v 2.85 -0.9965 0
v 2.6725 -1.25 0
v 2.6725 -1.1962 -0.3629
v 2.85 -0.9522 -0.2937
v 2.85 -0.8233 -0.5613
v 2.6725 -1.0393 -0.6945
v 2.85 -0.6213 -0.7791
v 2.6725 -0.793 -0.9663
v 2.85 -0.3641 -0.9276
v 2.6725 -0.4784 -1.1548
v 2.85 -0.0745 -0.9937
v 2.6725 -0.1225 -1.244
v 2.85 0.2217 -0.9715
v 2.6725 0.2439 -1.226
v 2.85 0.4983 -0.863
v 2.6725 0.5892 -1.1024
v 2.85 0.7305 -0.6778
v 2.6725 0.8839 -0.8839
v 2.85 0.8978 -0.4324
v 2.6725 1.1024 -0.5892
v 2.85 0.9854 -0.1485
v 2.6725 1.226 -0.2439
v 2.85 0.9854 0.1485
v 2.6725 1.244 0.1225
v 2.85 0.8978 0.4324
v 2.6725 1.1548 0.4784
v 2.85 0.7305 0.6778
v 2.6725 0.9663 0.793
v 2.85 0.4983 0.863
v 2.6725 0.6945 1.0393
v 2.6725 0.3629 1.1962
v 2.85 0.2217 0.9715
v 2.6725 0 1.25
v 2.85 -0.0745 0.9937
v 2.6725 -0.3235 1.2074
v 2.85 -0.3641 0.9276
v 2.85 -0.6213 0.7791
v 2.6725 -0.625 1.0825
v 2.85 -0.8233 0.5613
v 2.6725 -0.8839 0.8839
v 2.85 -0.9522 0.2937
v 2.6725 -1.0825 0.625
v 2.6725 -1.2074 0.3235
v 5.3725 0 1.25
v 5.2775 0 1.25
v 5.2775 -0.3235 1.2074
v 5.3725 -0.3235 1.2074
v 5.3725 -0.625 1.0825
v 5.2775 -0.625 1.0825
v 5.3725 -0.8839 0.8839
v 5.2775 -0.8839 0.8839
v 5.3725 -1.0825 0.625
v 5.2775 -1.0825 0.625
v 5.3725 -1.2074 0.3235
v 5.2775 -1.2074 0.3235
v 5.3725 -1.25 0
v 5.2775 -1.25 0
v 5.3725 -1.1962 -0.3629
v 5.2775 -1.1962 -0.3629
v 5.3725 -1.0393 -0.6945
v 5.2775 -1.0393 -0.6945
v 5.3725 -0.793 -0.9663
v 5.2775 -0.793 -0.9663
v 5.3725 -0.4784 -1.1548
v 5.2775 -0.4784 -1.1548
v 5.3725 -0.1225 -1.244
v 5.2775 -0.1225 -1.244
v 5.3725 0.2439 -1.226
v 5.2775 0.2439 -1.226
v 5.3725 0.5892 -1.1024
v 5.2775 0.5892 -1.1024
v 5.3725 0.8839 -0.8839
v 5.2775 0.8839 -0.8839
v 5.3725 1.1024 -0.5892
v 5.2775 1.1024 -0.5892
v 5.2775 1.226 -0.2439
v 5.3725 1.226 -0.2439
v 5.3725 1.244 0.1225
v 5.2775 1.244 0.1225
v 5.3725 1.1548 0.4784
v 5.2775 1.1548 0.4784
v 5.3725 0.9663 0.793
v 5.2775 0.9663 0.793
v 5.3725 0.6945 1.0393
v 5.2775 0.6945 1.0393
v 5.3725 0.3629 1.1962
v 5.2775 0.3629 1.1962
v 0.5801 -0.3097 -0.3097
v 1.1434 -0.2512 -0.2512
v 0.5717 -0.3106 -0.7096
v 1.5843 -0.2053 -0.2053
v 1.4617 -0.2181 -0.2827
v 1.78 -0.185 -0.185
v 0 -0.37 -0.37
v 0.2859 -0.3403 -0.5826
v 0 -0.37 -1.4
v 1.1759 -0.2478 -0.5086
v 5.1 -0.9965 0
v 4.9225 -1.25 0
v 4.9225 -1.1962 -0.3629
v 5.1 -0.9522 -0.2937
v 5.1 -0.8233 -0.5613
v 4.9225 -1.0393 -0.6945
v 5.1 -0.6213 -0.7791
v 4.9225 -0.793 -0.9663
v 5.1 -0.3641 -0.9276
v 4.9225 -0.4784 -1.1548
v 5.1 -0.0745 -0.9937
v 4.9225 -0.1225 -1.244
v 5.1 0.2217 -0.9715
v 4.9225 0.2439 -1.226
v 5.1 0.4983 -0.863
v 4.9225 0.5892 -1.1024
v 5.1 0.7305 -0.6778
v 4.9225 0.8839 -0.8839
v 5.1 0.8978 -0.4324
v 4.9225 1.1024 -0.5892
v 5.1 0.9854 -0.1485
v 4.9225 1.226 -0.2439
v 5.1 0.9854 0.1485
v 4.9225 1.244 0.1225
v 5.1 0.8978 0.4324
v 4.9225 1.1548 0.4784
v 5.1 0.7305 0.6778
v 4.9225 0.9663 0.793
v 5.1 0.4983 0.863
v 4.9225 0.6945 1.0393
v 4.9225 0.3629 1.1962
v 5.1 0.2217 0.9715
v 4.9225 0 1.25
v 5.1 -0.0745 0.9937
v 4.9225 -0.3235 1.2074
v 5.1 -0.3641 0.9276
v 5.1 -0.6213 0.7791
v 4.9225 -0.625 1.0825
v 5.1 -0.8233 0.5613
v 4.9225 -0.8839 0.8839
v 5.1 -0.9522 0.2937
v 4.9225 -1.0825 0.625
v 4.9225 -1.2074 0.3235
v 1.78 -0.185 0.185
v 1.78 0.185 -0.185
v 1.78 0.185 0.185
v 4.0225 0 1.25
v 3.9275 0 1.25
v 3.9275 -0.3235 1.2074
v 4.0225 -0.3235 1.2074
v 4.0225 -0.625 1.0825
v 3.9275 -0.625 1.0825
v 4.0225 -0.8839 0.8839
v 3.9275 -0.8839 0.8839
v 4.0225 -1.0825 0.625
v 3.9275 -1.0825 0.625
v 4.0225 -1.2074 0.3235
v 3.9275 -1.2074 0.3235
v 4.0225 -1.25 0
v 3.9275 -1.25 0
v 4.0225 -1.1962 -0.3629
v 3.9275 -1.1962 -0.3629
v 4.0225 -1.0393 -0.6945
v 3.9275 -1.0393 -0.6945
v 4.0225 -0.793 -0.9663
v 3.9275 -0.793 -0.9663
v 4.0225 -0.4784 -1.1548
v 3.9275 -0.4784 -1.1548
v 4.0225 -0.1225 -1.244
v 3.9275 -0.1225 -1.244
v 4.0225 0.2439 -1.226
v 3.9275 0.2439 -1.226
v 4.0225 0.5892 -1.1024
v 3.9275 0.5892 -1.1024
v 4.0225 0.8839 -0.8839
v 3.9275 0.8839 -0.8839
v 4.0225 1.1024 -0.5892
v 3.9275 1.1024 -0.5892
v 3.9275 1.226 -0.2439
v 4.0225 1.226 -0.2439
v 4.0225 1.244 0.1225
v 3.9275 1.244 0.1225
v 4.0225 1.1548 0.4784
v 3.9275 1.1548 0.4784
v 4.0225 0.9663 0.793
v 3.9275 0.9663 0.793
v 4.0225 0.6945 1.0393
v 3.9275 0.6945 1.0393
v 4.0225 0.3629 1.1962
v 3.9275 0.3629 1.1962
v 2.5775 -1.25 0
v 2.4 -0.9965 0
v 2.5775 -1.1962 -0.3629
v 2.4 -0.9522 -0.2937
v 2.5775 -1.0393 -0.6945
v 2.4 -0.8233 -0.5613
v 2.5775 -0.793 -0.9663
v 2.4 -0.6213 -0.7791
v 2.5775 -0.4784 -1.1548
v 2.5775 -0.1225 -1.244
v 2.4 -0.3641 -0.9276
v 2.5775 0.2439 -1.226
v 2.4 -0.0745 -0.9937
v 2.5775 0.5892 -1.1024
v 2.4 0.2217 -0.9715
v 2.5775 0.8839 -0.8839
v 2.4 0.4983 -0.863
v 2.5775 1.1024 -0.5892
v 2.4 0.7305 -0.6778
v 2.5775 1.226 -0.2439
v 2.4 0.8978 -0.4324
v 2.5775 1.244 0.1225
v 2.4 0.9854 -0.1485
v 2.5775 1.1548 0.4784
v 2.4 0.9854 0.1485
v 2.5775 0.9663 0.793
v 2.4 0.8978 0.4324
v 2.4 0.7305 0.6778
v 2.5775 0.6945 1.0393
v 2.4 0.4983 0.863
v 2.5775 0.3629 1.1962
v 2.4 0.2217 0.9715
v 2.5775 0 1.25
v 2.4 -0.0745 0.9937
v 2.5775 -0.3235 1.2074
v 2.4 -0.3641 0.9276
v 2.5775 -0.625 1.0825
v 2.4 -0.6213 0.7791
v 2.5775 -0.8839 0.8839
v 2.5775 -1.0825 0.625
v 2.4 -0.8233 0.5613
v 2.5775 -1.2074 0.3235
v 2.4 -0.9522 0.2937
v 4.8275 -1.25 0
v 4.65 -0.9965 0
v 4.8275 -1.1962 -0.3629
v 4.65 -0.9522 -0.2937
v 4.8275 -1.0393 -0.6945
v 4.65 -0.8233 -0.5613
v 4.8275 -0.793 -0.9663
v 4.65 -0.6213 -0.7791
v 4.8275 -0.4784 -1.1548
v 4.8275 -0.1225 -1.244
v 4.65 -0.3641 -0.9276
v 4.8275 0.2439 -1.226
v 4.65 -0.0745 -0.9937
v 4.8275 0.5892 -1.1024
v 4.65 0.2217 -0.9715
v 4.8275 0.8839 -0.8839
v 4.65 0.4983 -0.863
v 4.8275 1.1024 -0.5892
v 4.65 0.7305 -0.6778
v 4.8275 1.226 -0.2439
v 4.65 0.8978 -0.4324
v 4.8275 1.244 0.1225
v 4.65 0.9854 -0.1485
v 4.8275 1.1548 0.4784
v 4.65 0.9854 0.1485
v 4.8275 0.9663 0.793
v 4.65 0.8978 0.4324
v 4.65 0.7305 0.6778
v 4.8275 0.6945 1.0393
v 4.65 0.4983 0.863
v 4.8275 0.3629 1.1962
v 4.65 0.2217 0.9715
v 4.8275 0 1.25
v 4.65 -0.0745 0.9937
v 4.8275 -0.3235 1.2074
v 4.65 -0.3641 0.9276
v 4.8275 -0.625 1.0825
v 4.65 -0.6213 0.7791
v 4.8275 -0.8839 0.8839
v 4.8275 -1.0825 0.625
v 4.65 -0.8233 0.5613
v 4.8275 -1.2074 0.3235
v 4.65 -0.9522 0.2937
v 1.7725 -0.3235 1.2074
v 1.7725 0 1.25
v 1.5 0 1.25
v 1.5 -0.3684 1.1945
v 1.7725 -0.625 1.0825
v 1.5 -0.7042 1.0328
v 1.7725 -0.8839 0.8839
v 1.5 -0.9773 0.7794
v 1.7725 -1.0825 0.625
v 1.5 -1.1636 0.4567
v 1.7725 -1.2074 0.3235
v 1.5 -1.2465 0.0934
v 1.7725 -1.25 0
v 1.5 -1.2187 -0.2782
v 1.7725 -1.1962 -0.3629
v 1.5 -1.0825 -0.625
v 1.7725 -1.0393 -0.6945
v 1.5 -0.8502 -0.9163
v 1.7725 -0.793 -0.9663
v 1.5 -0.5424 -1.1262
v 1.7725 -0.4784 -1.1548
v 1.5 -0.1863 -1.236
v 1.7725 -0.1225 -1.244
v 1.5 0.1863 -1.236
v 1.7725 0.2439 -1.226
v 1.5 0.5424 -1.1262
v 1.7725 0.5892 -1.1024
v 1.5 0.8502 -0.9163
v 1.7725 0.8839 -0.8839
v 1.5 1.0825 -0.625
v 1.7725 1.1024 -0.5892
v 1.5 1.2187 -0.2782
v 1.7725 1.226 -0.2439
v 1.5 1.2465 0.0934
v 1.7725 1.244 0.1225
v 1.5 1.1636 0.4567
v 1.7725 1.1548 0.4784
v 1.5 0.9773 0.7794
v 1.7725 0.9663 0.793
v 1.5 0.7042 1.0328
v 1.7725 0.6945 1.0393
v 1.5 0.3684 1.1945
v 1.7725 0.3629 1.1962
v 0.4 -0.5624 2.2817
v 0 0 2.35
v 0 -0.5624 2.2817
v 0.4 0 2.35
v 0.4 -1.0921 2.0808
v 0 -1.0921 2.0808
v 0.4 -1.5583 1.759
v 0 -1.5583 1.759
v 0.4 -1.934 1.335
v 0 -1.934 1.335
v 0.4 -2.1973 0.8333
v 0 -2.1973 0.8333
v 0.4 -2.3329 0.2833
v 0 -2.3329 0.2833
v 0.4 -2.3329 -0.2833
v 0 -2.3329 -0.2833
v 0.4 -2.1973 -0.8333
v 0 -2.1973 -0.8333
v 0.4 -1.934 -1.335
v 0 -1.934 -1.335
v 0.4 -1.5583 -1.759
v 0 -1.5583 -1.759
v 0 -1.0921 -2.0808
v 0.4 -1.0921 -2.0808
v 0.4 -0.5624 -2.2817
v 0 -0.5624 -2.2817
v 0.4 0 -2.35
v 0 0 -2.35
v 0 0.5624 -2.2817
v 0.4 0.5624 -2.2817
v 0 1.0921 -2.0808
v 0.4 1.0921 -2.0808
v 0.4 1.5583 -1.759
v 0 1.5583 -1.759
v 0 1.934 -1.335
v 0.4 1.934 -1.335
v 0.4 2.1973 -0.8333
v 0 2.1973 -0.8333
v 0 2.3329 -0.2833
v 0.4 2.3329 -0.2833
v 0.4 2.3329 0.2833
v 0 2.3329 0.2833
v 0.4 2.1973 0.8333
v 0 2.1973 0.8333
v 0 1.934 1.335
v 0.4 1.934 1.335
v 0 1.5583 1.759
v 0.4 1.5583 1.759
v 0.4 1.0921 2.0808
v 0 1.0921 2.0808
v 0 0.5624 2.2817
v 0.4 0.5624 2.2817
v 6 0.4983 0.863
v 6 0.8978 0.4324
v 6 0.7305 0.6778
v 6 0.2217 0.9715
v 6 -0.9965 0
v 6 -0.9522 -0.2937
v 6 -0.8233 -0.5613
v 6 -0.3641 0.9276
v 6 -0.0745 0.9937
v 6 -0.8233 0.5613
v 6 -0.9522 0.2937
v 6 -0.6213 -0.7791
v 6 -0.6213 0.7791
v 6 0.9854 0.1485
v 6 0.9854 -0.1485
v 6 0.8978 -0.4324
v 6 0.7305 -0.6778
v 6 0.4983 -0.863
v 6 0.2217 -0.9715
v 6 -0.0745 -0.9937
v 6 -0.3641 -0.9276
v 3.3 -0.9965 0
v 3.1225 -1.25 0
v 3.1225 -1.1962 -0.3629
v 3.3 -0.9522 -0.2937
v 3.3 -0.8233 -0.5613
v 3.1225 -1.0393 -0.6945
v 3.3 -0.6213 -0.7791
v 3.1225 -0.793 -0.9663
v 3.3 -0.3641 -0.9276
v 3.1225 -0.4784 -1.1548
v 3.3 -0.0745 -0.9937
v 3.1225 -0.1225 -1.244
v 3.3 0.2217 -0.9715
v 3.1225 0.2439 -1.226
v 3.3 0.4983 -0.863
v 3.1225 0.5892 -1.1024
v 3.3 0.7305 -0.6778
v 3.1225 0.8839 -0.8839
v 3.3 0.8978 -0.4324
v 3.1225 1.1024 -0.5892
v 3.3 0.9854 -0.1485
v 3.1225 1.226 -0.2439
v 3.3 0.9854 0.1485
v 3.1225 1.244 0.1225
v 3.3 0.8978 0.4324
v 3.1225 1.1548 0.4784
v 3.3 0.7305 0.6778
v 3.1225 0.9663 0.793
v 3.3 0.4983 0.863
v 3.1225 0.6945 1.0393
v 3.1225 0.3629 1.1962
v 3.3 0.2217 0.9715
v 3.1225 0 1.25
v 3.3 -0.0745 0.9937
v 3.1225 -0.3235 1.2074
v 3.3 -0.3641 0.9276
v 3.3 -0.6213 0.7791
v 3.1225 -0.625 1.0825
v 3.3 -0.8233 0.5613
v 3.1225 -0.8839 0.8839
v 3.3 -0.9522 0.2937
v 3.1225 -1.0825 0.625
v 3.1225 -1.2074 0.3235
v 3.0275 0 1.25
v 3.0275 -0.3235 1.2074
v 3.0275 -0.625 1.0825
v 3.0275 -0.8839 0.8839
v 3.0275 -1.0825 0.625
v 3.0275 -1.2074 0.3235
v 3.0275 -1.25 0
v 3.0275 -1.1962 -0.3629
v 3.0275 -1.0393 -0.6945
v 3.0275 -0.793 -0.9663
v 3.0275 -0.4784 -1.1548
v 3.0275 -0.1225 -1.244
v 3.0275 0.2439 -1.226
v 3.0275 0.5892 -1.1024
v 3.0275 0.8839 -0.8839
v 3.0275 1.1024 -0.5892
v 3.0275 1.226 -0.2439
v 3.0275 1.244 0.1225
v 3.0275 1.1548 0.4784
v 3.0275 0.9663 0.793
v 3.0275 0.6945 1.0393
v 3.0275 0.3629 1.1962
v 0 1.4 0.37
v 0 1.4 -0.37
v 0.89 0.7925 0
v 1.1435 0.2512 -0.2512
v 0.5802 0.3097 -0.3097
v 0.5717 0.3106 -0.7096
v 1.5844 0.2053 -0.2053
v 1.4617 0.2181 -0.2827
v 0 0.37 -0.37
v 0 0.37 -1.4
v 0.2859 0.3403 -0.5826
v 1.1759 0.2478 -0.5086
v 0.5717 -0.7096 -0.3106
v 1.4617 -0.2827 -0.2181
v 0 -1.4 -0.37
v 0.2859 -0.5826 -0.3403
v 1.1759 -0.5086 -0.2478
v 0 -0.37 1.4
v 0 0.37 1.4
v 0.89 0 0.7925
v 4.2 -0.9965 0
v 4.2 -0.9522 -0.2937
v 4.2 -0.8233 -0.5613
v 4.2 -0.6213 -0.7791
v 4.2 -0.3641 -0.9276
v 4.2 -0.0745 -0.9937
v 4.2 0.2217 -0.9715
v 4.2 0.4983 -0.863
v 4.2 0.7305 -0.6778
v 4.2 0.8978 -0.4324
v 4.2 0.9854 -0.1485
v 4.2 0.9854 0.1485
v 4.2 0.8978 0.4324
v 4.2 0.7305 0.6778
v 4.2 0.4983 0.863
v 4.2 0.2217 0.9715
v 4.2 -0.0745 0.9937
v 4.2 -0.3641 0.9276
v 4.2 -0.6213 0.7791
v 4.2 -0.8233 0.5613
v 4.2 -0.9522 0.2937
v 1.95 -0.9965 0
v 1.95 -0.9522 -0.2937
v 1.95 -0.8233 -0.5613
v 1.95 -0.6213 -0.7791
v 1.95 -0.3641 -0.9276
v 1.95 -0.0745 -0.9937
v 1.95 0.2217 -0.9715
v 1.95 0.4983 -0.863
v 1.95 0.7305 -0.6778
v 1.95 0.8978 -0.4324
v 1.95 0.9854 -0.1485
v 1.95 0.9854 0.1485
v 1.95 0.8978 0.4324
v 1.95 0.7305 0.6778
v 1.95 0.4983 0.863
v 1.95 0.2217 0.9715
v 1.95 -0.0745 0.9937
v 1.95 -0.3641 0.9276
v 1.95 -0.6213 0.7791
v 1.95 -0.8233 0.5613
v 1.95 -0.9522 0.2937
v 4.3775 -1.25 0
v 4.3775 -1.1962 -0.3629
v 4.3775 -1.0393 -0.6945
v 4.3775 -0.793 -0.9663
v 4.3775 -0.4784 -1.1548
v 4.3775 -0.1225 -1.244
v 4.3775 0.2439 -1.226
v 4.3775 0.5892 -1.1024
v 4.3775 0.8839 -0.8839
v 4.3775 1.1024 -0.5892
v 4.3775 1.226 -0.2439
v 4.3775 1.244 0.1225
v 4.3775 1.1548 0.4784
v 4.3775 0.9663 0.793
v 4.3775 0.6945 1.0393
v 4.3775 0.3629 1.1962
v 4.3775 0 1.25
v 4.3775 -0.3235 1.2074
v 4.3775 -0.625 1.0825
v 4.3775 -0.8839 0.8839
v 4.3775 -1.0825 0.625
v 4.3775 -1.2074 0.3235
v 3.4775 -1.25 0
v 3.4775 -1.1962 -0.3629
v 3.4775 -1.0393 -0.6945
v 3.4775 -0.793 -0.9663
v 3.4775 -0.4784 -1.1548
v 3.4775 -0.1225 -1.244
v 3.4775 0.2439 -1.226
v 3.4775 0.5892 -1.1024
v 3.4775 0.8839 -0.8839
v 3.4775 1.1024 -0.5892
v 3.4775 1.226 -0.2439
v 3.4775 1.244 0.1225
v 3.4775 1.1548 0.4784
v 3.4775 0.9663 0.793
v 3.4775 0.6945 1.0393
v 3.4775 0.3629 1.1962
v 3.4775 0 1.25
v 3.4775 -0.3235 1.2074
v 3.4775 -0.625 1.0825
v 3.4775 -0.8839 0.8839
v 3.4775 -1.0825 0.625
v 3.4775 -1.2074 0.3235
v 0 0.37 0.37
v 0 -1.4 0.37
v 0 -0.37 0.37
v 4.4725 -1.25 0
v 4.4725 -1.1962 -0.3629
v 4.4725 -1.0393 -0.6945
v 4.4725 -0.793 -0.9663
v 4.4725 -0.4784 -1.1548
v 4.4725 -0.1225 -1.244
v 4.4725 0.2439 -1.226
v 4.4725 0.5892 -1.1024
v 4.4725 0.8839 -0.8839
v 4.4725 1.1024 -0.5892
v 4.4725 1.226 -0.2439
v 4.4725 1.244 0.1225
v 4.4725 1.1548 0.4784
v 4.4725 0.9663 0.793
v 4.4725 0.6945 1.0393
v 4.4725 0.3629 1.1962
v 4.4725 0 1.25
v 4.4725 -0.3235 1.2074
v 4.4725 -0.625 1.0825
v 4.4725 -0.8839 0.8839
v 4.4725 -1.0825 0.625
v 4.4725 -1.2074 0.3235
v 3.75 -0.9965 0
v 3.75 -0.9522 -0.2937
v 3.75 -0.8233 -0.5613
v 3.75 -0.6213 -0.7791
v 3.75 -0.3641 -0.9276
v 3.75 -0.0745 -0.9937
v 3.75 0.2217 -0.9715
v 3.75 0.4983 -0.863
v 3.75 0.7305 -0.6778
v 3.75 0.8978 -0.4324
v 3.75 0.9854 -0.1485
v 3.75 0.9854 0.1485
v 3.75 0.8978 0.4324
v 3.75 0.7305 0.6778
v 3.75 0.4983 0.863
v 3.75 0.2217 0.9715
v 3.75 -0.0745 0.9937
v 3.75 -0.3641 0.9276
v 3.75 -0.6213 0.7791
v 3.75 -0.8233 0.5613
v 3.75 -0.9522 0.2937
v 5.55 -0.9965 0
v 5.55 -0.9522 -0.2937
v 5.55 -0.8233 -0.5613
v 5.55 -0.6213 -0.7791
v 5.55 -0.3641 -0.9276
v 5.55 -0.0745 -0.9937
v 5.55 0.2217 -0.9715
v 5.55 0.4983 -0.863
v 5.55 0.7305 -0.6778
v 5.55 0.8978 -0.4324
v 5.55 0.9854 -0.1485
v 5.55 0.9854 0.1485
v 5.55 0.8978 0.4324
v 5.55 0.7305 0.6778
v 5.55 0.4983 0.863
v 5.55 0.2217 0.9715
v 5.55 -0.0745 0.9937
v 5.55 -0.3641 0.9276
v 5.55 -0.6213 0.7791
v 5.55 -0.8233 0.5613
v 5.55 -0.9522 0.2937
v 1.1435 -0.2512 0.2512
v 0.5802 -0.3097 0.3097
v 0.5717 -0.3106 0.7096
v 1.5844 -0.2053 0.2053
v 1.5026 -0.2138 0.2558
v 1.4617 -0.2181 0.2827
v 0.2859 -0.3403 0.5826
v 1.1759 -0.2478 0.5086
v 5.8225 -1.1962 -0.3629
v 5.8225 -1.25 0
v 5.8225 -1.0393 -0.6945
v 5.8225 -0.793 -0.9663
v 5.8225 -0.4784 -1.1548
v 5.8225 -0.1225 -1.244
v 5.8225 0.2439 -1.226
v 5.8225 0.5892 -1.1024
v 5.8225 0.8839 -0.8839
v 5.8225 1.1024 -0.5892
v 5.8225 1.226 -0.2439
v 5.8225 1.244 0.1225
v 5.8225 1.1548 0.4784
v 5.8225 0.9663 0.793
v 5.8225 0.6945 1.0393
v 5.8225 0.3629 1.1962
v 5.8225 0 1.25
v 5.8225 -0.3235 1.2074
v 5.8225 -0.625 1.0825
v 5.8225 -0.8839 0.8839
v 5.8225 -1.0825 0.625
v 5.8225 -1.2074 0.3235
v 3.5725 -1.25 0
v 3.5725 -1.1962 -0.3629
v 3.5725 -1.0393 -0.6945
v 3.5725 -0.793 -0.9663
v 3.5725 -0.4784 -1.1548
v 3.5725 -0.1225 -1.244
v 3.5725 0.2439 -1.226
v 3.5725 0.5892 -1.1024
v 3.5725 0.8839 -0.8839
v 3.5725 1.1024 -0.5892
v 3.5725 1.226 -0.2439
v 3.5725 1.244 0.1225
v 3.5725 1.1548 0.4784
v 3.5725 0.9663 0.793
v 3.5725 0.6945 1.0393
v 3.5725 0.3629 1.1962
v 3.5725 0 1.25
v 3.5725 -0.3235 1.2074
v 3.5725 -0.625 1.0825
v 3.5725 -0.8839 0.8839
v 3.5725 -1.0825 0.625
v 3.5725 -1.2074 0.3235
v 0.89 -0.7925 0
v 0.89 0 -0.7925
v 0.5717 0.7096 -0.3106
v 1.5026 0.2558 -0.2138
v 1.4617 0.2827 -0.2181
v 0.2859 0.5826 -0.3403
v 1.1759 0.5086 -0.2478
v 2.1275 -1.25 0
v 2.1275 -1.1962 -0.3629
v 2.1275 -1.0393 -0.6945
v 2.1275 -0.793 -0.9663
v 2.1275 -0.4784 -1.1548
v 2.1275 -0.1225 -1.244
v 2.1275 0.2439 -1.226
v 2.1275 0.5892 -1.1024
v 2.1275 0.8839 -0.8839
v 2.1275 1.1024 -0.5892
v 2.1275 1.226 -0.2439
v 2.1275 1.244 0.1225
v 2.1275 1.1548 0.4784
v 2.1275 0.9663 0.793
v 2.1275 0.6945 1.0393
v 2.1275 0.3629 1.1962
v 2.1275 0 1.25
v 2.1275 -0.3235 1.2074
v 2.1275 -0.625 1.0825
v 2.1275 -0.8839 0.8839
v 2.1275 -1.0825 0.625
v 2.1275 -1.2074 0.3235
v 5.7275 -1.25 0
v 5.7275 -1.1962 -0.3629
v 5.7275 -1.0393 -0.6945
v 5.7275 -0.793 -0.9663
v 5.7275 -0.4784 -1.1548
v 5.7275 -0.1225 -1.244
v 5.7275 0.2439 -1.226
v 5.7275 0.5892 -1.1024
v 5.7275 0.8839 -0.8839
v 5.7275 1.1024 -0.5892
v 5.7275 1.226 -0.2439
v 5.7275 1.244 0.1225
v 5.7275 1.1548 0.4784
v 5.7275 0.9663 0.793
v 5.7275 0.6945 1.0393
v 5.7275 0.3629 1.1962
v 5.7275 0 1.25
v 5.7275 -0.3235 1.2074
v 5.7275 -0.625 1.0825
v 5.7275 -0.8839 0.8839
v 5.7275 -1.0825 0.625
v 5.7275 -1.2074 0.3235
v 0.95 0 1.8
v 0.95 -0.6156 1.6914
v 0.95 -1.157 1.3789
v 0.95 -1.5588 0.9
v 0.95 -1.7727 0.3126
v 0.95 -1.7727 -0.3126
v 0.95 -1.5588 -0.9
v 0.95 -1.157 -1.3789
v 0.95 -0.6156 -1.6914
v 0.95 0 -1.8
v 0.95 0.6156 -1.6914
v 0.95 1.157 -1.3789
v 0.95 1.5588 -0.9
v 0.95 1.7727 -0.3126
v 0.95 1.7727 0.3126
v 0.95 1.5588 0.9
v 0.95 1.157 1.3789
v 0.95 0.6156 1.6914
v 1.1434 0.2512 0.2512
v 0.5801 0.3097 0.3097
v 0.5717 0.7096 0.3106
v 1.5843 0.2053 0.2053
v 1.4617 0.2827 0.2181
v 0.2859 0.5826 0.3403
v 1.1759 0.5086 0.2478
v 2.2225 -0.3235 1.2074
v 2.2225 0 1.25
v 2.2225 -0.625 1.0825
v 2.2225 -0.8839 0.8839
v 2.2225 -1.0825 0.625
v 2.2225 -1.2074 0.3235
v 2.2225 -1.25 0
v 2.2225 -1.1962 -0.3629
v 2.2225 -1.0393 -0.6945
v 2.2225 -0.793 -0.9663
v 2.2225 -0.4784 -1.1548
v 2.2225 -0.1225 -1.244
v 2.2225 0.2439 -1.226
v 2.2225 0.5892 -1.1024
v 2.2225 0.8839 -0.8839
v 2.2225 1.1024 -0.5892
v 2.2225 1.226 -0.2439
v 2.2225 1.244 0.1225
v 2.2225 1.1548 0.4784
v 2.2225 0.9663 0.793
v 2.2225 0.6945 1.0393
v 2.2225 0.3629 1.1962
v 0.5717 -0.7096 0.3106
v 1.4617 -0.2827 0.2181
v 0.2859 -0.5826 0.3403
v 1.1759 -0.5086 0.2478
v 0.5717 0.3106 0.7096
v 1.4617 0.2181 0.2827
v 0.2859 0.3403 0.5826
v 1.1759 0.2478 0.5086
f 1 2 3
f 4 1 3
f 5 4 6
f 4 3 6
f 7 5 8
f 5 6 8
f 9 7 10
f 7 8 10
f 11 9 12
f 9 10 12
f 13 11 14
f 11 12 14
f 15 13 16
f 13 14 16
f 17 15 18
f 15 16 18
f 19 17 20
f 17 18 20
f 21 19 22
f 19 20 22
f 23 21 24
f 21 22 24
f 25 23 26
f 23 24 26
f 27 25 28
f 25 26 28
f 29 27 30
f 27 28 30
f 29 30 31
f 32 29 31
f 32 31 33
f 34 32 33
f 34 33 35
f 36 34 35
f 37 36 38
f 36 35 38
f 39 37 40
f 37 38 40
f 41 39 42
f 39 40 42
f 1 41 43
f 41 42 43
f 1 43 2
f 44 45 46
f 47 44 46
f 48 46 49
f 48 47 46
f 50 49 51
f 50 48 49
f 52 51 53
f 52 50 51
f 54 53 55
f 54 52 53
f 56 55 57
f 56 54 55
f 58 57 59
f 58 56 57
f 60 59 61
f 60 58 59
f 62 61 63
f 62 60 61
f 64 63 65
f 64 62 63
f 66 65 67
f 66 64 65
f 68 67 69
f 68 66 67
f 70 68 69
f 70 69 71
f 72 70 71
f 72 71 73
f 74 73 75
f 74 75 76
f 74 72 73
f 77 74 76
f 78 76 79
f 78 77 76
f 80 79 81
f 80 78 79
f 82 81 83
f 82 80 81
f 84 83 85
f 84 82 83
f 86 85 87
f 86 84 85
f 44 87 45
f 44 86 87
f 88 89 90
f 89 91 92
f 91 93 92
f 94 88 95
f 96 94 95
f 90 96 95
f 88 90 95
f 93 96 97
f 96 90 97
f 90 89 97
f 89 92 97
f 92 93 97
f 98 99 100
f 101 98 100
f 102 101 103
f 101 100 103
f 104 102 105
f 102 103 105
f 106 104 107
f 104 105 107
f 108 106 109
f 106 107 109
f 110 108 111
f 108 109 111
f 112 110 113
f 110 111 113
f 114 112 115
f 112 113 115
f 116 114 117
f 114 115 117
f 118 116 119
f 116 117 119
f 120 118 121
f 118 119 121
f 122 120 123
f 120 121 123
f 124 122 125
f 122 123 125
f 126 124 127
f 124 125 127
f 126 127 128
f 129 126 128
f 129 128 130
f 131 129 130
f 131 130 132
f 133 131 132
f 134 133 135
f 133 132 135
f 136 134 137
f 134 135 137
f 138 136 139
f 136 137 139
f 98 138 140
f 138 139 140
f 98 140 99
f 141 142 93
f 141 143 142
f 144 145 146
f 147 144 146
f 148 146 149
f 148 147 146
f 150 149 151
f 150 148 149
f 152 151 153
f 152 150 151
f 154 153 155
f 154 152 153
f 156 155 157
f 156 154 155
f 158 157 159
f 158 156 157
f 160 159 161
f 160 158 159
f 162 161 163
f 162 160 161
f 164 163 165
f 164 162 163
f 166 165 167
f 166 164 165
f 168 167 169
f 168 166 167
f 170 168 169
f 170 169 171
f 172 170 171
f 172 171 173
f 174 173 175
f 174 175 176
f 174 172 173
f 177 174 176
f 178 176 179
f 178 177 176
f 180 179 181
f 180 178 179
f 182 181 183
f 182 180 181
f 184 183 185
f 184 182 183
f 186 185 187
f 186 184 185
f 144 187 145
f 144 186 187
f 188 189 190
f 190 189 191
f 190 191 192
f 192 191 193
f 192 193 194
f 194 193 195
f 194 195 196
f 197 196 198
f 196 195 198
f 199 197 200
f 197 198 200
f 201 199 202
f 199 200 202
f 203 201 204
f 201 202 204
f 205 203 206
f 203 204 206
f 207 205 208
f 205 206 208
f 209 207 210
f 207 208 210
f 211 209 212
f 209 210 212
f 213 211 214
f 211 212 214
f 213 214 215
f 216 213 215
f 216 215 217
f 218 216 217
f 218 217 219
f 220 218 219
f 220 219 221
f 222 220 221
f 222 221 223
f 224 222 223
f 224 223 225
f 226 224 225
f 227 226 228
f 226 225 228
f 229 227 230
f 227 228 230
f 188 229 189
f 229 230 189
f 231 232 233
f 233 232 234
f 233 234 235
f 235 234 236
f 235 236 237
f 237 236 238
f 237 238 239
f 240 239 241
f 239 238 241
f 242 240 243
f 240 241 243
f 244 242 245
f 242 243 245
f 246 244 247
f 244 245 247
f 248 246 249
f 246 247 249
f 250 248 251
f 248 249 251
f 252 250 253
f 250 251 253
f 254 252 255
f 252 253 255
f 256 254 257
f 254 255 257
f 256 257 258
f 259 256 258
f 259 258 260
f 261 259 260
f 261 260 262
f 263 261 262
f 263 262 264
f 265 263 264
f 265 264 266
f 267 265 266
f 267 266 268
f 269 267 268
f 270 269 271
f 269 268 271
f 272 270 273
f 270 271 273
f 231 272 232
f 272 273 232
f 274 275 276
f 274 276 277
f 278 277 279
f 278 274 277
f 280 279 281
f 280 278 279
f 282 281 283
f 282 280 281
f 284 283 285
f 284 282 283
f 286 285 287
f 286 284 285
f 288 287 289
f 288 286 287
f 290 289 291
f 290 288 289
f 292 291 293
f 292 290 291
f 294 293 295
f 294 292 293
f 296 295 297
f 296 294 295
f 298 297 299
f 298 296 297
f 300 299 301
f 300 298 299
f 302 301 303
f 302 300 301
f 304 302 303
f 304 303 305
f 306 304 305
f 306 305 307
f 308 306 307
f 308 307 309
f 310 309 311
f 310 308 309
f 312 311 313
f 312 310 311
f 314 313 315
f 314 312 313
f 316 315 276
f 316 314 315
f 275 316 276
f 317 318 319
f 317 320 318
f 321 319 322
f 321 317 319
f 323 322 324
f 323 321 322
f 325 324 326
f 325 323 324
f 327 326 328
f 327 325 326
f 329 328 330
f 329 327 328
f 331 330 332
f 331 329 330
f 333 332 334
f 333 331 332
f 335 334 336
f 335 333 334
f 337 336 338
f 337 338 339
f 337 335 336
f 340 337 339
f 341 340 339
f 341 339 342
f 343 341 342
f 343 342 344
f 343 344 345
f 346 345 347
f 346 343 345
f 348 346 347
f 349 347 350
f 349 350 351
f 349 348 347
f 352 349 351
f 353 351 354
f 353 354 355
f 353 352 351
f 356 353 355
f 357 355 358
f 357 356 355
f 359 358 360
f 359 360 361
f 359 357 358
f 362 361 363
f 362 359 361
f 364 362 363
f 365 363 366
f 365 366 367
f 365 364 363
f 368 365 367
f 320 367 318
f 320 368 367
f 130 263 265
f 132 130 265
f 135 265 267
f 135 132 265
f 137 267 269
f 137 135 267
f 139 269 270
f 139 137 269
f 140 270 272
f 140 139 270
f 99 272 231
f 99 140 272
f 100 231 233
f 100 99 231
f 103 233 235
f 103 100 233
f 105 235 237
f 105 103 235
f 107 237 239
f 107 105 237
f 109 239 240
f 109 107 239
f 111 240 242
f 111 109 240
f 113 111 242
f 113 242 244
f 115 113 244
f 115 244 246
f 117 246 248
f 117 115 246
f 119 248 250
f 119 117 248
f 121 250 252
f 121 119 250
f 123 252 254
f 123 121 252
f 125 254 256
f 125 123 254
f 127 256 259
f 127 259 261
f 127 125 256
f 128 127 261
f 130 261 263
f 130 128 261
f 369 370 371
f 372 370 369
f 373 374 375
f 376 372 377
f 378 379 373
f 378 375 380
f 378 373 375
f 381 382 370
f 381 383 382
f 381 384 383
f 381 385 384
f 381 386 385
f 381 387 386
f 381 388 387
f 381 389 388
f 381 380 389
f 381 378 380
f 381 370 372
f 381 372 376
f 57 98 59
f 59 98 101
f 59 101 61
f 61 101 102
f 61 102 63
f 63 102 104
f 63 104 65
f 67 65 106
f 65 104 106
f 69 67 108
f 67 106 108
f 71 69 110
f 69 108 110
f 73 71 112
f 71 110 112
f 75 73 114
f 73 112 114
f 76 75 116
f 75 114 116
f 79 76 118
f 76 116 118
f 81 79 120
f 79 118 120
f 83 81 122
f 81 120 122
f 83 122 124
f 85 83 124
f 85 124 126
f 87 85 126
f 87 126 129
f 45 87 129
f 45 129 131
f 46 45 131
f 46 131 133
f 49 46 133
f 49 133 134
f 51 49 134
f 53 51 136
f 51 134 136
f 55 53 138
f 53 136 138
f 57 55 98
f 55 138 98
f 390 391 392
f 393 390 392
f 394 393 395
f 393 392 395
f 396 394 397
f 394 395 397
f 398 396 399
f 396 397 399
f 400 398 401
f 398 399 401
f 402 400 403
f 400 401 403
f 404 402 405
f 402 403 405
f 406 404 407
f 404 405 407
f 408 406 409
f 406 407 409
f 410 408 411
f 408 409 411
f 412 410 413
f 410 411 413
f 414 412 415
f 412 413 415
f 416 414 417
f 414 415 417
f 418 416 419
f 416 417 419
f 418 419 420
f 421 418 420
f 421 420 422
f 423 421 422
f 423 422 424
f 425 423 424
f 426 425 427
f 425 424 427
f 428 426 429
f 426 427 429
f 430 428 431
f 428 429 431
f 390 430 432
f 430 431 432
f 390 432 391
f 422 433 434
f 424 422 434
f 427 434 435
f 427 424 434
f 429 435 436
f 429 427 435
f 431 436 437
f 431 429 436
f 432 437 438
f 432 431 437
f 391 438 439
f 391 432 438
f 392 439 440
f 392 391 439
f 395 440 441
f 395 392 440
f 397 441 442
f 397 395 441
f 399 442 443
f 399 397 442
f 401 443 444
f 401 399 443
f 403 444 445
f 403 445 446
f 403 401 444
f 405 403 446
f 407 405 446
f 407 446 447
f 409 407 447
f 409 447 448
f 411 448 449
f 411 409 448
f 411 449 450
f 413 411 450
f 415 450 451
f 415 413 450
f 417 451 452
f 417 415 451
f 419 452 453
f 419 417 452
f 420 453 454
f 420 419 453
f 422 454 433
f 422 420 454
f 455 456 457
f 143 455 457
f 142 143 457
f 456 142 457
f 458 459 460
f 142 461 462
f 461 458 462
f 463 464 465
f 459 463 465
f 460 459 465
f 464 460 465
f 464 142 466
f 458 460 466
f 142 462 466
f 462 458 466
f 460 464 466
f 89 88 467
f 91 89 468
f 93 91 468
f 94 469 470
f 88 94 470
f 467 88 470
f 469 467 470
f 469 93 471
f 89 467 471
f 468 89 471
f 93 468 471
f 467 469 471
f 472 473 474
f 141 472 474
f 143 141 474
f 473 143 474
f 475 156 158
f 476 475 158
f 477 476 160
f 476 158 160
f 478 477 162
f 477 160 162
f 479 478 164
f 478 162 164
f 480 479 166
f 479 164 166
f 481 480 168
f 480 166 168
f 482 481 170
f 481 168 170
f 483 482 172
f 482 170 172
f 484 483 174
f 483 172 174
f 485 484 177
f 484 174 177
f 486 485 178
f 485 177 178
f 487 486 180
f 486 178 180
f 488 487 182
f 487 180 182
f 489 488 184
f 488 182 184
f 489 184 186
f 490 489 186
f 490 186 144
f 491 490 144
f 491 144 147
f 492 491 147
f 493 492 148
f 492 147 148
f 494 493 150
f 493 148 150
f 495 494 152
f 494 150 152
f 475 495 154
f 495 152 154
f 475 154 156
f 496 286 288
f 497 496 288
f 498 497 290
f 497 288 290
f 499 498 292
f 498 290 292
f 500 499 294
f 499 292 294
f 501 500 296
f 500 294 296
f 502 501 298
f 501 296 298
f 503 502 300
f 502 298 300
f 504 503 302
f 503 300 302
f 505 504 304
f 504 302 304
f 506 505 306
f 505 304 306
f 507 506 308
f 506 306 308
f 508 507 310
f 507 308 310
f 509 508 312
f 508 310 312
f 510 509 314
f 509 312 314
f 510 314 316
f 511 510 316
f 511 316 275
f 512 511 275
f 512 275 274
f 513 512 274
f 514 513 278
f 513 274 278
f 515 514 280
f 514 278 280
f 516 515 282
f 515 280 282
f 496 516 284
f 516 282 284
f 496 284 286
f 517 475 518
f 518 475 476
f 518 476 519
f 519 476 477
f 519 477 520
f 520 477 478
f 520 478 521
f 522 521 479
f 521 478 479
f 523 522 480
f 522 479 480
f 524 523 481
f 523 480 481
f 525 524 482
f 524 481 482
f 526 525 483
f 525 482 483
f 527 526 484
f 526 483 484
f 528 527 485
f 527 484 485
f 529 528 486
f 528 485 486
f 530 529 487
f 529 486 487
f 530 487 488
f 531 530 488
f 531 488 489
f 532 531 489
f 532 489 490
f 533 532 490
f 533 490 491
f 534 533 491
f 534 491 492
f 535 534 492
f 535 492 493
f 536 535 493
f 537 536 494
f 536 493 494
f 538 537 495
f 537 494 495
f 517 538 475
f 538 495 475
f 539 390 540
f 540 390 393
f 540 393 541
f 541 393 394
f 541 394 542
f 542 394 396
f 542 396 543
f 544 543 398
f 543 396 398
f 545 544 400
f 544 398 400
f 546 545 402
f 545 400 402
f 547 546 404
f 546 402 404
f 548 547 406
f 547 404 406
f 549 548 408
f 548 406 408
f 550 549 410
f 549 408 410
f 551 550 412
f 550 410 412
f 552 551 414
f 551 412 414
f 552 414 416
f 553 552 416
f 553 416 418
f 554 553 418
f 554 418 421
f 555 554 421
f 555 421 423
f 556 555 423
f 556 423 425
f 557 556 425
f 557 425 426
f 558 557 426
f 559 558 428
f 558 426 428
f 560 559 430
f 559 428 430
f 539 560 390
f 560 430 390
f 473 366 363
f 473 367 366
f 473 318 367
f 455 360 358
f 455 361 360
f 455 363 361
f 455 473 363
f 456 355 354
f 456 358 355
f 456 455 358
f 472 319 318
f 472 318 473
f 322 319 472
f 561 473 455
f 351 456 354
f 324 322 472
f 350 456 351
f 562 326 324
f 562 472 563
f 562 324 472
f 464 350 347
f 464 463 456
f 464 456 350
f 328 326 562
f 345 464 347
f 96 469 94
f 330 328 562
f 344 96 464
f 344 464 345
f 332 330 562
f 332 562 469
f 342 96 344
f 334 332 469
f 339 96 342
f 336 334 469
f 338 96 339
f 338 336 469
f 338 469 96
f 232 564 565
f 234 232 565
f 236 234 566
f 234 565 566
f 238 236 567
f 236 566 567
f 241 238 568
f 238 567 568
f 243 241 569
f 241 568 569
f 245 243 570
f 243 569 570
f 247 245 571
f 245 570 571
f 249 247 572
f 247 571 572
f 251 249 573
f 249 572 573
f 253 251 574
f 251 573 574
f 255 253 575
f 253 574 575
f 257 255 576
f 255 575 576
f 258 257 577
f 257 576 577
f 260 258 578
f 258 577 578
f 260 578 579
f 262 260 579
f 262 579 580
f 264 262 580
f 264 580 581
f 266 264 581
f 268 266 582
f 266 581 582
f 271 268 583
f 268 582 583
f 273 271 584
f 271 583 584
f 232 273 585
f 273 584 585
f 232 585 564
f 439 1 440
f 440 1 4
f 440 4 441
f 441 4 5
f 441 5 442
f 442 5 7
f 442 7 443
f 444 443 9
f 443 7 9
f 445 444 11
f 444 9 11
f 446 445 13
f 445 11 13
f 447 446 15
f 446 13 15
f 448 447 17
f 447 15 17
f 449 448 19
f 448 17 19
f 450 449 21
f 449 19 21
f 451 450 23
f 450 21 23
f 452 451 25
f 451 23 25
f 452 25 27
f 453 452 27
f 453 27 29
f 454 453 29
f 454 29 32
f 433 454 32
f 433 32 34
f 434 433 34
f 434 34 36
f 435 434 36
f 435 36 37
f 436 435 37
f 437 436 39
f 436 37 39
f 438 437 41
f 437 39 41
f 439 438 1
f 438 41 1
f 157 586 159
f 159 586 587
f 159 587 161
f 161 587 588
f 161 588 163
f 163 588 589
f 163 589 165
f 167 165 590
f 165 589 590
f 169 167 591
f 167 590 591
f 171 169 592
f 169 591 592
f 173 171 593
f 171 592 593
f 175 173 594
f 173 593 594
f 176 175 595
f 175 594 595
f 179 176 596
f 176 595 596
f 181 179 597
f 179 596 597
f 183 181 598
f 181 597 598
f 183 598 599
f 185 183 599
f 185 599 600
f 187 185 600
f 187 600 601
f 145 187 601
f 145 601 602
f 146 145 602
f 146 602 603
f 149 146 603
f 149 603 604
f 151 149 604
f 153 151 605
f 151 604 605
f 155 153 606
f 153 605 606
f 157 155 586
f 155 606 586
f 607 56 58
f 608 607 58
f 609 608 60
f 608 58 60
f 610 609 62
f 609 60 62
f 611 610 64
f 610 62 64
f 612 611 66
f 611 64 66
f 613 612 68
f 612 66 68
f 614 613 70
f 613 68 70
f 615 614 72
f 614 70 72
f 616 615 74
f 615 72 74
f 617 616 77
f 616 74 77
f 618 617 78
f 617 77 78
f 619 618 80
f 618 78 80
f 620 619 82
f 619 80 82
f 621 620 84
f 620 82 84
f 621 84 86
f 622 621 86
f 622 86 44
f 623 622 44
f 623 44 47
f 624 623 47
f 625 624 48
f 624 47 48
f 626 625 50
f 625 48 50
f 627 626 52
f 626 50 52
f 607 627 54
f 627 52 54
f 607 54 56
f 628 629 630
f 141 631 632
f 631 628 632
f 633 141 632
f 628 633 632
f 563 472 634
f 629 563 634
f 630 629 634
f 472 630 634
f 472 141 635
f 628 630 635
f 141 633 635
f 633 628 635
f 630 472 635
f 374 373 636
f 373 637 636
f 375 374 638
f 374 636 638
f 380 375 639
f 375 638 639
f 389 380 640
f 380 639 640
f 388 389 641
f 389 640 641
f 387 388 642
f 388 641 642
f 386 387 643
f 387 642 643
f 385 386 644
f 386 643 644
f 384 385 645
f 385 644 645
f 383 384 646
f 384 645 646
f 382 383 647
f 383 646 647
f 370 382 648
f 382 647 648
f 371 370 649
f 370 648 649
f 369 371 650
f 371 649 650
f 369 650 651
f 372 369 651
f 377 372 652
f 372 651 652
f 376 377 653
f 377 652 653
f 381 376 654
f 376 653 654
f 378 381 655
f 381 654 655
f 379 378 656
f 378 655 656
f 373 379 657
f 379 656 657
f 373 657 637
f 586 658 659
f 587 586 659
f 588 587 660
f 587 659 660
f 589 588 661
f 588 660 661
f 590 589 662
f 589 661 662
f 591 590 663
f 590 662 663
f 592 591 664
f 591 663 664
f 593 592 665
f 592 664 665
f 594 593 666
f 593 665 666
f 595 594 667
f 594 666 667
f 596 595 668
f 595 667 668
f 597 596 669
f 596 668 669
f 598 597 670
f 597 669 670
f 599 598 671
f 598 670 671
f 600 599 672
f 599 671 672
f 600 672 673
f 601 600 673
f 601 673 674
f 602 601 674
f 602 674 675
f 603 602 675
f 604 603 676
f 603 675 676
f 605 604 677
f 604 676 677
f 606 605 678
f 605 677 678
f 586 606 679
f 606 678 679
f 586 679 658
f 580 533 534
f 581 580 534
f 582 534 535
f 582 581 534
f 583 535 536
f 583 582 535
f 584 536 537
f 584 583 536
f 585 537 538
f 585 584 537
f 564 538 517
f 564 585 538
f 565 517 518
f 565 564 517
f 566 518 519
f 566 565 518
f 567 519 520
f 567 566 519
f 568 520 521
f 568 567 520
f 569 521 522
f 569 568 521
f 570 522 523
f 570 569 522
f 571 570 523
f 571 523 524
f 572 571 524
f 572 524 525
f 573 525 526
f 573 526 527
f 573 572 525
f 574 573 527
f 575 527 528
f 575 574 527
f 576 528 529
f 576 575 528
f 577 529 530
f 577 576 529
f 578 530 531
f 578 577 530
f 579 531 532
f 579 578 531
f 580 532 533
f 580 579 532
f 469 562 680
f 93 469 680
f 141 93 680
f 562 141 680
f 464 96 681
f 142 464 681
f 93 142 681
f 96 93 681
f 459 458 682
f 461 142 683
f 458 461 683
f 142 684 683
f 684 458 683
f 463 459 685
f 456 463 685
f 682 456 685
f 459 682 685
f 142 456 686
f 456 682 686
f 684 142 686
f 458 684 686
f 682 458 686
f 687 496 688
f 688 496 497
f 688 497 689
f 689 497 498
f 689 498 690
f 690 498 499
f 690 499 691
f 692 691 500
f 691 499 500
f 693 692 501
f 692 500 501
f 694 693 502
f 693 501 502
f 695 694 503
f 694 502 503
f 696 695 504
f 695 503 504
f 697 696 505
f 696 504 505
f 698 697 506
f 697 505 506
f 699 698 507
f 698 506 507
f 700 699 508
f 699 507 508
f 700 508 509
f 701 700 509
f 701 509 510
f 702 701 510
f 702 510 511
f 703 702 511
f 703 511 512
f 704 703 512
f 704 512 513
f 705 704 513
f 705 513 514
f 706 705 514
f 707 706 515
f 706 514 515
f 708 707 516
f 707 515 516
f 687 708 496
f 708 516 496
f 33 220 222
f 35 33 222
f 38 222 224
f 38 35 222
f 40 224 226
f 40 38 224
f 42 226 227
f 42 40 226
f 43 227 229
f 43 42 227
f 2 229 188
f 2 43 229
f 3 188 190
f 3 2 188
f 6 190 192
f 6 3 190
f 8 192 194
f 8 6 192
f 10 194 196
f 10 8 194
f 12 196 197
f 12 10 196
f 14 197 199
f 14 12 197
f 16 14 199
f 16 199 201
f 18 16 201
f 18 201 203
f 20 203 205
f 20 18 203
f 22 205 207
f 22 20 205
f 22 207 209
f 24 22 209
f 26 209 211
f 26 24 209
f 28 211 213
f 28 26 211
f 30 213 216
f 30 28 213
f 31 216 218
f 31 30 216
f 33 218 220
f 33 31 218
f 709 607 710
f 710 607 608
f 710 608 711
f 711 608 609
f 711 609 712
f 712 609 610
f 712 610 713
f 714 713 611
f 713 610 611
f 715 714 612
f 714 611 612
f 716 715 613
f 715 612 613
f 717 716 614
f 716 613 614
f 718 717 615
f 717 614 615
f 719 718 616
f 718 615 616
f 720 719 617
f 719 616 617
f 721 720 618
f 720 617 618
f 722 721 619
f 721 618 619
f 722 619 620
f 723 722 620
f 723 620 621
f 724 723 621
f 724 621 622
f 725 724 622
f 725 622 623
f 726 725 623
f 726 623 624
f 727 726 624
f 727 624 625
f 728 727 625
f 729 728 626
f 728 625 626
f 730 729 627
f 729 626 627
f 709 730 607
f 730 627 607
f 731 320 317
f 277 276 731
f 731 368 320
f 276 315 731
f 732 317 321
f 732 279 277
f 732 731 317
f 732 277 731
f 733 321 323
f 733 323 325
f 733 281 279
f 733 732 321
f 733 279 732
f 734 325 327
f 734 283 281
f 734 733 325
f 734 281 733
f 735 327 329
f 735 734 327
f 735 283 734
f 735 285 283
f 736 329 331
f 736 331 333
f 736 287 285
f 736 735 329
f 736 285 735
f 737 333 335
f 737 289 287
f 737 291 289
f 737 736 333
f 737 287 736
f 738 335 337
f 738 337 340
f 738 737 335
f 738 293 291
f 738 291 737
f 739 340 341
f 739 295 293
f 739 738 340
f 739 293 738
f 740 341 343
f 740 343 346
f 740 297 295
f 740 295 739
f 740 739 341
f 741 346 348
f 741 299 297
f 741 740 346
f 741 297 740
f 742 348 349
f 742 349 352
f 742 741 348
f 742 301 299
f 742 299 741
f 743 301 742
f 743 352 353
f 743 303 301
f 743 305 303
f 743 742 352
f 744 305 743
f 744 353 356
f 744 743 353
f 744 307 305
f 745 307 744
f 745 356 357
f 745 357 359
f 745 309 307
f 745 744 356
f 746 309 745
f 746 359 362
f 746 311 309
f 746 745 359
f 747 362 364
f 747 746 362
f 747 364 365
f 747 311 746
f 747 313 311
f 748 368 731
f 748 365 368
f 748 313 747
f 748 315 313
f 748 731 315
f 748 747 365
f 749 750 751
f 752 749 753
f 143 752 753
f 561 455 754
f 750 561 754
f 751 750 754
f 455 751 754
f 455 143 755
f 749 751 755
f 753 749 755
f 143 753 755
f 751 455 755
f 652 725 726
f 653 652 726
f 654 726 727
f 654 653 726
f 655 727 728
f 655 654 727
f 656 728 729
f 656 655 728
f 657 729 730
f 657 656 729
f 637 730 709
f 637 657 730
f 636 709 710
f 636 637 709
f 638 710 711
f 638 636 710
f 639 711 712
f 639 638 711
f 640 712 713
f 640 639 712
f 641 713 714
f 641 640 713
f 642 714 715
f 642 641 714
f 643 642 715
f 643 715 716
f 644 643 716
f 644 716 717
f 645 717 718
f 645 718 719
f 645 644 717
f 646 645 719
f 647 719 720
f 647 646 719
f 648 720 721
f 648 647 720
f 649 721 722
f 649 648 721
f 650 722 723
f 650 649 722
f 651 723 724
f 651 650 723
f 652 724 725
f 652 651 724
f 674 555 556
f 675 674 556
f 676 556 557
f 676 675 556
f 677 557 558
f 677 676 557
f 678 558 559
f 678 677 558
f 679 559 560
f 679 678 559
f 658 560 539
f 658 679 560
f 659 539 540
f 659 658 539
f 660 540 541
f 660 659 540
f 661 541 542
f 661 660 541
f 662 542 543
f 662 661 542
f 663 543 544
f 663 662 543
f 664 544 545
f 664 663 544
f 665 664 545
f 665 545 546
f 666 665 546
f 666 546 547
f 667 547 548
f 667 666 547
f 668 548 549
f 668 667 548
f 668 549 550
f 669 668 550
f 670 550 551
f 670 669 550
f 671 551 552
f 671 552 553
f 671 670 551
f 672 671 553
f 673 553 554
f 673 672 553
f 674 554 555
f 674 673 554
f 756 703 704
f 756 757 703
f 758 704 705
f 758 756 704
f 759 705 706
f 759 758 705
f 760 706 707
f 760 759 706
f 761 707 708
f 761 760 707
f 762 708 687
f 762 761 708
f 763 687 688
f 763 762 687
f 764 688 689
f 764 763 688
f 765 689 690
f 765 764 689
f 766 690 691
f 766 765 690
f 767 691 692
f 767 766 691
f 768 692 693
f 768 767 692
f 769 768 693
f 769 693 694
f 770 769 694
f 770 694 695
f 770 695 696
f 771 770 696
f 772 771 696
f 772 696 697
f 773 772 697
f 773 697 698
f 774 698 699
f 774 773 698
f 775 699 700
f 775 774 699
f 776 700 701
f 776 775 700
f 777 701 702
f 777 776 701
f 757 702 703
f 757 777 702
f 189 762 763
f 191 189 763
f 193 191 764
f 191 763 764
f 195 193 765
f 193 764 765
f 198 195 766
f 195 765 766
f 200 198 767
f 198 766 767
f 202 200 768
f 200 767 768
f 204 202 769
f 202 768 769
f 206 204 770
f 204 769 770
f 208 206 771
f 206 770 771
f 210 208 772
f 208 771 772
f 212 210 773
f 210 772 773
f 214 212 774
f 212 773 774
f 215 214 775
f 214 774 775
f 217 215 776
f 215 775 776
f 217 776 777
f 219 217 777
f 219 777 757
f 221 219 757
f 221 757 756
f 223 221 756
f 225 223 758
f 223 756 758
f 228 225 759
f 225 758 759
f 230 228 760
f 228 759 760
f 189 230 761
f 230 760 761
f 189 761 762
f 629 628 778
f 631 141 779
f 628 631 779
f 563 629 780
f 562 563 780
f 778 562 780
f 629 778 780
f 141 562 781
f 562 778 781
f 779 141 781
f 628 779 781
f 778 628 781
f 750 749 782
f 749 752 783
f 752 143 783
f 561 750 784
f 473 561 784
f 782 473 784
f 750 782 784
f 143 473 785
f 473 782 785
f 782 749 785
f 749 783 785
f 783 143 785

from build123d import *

# Parameters (mm, degrees)
CIRPATTERN1_COUNT = 2
CIRPATTERN1_ANGLE = 90
THDSCHPAT_COUNT   = 10
THDSCHPAT_PITCH   = 0.45


with BuildPart() as part:
    # BodySke → Base-Revolve (revolve)
    with BuildSketch(Plane.XY, mode=Mode.PRIVATE) as base_revolve_sk:
        Polygon((0, 0), (0, 2.35), (0.4, 2.35), (1.5, 1.25), (6, 1.25), (6, 0), align=None)
    revolve(base_revolve_sk.sketch.rotate(Axis((-6.35, 0, 0), (1, 0, 0)), 90), axis=Axis((-6.35, 0, 0), (1, 0, 0)))

    # Sketch3 → Cross section 0
    with BuildSketch(Plane.ZY):
        with BuildLine():
            Line((-0.37, 1.4), (0.37, 1.4))
            Line((0.37, 1.4), (0.37, -1.4))
            Line((0.37, -1.4), (-0.37, -1.4))
            Line((-0.37, -1.4), (-0.37, 1.4))
        make_face()
    # Sketch4 → Cross section 1
    with BuildSketch(Plane.ZY.offset(-1.78)):
        with BuildLine():
            Line((-0.185, 0.185), (0.185, 0.185))
            Line((0.185, 0.185), (0.185, -0.185))
            Line((0.185, -0.185), (-0.185, -0.185))
            Line((-0.185, -0.185), (-0.185, 0.185))
        make_face()
    cross = loft(mode=Mode.SUBTRACT)

    # CirPattern1: Cross ×2 about axis
    cirpattern1_axis = Axis((0, 0, 0), (1, 0, 0))
    for i in range(1, CIRPATTERN1_COUNT):
        add(cross.rotate(cirpattern1_axis, i * CIRPATTERN1_ANGLE / (CIRPATTERN1_COUNT - 1)), mode=Mode.SUBTRACT)

    # ThdSchSke → ThreadSchematic (revolve, cut)
    with BuildSketch(Plane.XY):
        Polygon((1.950001, -0.9965), (1.772498389, -1.25), (1.772498389, -1.5625), (2.127503611, -1.5625), (2.127503611, -1.25), align=None)
    threadschematic = revolve(axis=Axis((-3.175, 0, 0), (1, 0, 0)), mode=Mode.SUBTRACT)

    # ThdSchPat: ThreadSchematic ×10
    with Locations(*[(i * THDSCHPAT_PITCH, 0, 0) for i in range(1, THDSCHPAT_COUNT)]):
        add(threadschematic, mode=Mode.SUBTRACT)


solid = part.part
